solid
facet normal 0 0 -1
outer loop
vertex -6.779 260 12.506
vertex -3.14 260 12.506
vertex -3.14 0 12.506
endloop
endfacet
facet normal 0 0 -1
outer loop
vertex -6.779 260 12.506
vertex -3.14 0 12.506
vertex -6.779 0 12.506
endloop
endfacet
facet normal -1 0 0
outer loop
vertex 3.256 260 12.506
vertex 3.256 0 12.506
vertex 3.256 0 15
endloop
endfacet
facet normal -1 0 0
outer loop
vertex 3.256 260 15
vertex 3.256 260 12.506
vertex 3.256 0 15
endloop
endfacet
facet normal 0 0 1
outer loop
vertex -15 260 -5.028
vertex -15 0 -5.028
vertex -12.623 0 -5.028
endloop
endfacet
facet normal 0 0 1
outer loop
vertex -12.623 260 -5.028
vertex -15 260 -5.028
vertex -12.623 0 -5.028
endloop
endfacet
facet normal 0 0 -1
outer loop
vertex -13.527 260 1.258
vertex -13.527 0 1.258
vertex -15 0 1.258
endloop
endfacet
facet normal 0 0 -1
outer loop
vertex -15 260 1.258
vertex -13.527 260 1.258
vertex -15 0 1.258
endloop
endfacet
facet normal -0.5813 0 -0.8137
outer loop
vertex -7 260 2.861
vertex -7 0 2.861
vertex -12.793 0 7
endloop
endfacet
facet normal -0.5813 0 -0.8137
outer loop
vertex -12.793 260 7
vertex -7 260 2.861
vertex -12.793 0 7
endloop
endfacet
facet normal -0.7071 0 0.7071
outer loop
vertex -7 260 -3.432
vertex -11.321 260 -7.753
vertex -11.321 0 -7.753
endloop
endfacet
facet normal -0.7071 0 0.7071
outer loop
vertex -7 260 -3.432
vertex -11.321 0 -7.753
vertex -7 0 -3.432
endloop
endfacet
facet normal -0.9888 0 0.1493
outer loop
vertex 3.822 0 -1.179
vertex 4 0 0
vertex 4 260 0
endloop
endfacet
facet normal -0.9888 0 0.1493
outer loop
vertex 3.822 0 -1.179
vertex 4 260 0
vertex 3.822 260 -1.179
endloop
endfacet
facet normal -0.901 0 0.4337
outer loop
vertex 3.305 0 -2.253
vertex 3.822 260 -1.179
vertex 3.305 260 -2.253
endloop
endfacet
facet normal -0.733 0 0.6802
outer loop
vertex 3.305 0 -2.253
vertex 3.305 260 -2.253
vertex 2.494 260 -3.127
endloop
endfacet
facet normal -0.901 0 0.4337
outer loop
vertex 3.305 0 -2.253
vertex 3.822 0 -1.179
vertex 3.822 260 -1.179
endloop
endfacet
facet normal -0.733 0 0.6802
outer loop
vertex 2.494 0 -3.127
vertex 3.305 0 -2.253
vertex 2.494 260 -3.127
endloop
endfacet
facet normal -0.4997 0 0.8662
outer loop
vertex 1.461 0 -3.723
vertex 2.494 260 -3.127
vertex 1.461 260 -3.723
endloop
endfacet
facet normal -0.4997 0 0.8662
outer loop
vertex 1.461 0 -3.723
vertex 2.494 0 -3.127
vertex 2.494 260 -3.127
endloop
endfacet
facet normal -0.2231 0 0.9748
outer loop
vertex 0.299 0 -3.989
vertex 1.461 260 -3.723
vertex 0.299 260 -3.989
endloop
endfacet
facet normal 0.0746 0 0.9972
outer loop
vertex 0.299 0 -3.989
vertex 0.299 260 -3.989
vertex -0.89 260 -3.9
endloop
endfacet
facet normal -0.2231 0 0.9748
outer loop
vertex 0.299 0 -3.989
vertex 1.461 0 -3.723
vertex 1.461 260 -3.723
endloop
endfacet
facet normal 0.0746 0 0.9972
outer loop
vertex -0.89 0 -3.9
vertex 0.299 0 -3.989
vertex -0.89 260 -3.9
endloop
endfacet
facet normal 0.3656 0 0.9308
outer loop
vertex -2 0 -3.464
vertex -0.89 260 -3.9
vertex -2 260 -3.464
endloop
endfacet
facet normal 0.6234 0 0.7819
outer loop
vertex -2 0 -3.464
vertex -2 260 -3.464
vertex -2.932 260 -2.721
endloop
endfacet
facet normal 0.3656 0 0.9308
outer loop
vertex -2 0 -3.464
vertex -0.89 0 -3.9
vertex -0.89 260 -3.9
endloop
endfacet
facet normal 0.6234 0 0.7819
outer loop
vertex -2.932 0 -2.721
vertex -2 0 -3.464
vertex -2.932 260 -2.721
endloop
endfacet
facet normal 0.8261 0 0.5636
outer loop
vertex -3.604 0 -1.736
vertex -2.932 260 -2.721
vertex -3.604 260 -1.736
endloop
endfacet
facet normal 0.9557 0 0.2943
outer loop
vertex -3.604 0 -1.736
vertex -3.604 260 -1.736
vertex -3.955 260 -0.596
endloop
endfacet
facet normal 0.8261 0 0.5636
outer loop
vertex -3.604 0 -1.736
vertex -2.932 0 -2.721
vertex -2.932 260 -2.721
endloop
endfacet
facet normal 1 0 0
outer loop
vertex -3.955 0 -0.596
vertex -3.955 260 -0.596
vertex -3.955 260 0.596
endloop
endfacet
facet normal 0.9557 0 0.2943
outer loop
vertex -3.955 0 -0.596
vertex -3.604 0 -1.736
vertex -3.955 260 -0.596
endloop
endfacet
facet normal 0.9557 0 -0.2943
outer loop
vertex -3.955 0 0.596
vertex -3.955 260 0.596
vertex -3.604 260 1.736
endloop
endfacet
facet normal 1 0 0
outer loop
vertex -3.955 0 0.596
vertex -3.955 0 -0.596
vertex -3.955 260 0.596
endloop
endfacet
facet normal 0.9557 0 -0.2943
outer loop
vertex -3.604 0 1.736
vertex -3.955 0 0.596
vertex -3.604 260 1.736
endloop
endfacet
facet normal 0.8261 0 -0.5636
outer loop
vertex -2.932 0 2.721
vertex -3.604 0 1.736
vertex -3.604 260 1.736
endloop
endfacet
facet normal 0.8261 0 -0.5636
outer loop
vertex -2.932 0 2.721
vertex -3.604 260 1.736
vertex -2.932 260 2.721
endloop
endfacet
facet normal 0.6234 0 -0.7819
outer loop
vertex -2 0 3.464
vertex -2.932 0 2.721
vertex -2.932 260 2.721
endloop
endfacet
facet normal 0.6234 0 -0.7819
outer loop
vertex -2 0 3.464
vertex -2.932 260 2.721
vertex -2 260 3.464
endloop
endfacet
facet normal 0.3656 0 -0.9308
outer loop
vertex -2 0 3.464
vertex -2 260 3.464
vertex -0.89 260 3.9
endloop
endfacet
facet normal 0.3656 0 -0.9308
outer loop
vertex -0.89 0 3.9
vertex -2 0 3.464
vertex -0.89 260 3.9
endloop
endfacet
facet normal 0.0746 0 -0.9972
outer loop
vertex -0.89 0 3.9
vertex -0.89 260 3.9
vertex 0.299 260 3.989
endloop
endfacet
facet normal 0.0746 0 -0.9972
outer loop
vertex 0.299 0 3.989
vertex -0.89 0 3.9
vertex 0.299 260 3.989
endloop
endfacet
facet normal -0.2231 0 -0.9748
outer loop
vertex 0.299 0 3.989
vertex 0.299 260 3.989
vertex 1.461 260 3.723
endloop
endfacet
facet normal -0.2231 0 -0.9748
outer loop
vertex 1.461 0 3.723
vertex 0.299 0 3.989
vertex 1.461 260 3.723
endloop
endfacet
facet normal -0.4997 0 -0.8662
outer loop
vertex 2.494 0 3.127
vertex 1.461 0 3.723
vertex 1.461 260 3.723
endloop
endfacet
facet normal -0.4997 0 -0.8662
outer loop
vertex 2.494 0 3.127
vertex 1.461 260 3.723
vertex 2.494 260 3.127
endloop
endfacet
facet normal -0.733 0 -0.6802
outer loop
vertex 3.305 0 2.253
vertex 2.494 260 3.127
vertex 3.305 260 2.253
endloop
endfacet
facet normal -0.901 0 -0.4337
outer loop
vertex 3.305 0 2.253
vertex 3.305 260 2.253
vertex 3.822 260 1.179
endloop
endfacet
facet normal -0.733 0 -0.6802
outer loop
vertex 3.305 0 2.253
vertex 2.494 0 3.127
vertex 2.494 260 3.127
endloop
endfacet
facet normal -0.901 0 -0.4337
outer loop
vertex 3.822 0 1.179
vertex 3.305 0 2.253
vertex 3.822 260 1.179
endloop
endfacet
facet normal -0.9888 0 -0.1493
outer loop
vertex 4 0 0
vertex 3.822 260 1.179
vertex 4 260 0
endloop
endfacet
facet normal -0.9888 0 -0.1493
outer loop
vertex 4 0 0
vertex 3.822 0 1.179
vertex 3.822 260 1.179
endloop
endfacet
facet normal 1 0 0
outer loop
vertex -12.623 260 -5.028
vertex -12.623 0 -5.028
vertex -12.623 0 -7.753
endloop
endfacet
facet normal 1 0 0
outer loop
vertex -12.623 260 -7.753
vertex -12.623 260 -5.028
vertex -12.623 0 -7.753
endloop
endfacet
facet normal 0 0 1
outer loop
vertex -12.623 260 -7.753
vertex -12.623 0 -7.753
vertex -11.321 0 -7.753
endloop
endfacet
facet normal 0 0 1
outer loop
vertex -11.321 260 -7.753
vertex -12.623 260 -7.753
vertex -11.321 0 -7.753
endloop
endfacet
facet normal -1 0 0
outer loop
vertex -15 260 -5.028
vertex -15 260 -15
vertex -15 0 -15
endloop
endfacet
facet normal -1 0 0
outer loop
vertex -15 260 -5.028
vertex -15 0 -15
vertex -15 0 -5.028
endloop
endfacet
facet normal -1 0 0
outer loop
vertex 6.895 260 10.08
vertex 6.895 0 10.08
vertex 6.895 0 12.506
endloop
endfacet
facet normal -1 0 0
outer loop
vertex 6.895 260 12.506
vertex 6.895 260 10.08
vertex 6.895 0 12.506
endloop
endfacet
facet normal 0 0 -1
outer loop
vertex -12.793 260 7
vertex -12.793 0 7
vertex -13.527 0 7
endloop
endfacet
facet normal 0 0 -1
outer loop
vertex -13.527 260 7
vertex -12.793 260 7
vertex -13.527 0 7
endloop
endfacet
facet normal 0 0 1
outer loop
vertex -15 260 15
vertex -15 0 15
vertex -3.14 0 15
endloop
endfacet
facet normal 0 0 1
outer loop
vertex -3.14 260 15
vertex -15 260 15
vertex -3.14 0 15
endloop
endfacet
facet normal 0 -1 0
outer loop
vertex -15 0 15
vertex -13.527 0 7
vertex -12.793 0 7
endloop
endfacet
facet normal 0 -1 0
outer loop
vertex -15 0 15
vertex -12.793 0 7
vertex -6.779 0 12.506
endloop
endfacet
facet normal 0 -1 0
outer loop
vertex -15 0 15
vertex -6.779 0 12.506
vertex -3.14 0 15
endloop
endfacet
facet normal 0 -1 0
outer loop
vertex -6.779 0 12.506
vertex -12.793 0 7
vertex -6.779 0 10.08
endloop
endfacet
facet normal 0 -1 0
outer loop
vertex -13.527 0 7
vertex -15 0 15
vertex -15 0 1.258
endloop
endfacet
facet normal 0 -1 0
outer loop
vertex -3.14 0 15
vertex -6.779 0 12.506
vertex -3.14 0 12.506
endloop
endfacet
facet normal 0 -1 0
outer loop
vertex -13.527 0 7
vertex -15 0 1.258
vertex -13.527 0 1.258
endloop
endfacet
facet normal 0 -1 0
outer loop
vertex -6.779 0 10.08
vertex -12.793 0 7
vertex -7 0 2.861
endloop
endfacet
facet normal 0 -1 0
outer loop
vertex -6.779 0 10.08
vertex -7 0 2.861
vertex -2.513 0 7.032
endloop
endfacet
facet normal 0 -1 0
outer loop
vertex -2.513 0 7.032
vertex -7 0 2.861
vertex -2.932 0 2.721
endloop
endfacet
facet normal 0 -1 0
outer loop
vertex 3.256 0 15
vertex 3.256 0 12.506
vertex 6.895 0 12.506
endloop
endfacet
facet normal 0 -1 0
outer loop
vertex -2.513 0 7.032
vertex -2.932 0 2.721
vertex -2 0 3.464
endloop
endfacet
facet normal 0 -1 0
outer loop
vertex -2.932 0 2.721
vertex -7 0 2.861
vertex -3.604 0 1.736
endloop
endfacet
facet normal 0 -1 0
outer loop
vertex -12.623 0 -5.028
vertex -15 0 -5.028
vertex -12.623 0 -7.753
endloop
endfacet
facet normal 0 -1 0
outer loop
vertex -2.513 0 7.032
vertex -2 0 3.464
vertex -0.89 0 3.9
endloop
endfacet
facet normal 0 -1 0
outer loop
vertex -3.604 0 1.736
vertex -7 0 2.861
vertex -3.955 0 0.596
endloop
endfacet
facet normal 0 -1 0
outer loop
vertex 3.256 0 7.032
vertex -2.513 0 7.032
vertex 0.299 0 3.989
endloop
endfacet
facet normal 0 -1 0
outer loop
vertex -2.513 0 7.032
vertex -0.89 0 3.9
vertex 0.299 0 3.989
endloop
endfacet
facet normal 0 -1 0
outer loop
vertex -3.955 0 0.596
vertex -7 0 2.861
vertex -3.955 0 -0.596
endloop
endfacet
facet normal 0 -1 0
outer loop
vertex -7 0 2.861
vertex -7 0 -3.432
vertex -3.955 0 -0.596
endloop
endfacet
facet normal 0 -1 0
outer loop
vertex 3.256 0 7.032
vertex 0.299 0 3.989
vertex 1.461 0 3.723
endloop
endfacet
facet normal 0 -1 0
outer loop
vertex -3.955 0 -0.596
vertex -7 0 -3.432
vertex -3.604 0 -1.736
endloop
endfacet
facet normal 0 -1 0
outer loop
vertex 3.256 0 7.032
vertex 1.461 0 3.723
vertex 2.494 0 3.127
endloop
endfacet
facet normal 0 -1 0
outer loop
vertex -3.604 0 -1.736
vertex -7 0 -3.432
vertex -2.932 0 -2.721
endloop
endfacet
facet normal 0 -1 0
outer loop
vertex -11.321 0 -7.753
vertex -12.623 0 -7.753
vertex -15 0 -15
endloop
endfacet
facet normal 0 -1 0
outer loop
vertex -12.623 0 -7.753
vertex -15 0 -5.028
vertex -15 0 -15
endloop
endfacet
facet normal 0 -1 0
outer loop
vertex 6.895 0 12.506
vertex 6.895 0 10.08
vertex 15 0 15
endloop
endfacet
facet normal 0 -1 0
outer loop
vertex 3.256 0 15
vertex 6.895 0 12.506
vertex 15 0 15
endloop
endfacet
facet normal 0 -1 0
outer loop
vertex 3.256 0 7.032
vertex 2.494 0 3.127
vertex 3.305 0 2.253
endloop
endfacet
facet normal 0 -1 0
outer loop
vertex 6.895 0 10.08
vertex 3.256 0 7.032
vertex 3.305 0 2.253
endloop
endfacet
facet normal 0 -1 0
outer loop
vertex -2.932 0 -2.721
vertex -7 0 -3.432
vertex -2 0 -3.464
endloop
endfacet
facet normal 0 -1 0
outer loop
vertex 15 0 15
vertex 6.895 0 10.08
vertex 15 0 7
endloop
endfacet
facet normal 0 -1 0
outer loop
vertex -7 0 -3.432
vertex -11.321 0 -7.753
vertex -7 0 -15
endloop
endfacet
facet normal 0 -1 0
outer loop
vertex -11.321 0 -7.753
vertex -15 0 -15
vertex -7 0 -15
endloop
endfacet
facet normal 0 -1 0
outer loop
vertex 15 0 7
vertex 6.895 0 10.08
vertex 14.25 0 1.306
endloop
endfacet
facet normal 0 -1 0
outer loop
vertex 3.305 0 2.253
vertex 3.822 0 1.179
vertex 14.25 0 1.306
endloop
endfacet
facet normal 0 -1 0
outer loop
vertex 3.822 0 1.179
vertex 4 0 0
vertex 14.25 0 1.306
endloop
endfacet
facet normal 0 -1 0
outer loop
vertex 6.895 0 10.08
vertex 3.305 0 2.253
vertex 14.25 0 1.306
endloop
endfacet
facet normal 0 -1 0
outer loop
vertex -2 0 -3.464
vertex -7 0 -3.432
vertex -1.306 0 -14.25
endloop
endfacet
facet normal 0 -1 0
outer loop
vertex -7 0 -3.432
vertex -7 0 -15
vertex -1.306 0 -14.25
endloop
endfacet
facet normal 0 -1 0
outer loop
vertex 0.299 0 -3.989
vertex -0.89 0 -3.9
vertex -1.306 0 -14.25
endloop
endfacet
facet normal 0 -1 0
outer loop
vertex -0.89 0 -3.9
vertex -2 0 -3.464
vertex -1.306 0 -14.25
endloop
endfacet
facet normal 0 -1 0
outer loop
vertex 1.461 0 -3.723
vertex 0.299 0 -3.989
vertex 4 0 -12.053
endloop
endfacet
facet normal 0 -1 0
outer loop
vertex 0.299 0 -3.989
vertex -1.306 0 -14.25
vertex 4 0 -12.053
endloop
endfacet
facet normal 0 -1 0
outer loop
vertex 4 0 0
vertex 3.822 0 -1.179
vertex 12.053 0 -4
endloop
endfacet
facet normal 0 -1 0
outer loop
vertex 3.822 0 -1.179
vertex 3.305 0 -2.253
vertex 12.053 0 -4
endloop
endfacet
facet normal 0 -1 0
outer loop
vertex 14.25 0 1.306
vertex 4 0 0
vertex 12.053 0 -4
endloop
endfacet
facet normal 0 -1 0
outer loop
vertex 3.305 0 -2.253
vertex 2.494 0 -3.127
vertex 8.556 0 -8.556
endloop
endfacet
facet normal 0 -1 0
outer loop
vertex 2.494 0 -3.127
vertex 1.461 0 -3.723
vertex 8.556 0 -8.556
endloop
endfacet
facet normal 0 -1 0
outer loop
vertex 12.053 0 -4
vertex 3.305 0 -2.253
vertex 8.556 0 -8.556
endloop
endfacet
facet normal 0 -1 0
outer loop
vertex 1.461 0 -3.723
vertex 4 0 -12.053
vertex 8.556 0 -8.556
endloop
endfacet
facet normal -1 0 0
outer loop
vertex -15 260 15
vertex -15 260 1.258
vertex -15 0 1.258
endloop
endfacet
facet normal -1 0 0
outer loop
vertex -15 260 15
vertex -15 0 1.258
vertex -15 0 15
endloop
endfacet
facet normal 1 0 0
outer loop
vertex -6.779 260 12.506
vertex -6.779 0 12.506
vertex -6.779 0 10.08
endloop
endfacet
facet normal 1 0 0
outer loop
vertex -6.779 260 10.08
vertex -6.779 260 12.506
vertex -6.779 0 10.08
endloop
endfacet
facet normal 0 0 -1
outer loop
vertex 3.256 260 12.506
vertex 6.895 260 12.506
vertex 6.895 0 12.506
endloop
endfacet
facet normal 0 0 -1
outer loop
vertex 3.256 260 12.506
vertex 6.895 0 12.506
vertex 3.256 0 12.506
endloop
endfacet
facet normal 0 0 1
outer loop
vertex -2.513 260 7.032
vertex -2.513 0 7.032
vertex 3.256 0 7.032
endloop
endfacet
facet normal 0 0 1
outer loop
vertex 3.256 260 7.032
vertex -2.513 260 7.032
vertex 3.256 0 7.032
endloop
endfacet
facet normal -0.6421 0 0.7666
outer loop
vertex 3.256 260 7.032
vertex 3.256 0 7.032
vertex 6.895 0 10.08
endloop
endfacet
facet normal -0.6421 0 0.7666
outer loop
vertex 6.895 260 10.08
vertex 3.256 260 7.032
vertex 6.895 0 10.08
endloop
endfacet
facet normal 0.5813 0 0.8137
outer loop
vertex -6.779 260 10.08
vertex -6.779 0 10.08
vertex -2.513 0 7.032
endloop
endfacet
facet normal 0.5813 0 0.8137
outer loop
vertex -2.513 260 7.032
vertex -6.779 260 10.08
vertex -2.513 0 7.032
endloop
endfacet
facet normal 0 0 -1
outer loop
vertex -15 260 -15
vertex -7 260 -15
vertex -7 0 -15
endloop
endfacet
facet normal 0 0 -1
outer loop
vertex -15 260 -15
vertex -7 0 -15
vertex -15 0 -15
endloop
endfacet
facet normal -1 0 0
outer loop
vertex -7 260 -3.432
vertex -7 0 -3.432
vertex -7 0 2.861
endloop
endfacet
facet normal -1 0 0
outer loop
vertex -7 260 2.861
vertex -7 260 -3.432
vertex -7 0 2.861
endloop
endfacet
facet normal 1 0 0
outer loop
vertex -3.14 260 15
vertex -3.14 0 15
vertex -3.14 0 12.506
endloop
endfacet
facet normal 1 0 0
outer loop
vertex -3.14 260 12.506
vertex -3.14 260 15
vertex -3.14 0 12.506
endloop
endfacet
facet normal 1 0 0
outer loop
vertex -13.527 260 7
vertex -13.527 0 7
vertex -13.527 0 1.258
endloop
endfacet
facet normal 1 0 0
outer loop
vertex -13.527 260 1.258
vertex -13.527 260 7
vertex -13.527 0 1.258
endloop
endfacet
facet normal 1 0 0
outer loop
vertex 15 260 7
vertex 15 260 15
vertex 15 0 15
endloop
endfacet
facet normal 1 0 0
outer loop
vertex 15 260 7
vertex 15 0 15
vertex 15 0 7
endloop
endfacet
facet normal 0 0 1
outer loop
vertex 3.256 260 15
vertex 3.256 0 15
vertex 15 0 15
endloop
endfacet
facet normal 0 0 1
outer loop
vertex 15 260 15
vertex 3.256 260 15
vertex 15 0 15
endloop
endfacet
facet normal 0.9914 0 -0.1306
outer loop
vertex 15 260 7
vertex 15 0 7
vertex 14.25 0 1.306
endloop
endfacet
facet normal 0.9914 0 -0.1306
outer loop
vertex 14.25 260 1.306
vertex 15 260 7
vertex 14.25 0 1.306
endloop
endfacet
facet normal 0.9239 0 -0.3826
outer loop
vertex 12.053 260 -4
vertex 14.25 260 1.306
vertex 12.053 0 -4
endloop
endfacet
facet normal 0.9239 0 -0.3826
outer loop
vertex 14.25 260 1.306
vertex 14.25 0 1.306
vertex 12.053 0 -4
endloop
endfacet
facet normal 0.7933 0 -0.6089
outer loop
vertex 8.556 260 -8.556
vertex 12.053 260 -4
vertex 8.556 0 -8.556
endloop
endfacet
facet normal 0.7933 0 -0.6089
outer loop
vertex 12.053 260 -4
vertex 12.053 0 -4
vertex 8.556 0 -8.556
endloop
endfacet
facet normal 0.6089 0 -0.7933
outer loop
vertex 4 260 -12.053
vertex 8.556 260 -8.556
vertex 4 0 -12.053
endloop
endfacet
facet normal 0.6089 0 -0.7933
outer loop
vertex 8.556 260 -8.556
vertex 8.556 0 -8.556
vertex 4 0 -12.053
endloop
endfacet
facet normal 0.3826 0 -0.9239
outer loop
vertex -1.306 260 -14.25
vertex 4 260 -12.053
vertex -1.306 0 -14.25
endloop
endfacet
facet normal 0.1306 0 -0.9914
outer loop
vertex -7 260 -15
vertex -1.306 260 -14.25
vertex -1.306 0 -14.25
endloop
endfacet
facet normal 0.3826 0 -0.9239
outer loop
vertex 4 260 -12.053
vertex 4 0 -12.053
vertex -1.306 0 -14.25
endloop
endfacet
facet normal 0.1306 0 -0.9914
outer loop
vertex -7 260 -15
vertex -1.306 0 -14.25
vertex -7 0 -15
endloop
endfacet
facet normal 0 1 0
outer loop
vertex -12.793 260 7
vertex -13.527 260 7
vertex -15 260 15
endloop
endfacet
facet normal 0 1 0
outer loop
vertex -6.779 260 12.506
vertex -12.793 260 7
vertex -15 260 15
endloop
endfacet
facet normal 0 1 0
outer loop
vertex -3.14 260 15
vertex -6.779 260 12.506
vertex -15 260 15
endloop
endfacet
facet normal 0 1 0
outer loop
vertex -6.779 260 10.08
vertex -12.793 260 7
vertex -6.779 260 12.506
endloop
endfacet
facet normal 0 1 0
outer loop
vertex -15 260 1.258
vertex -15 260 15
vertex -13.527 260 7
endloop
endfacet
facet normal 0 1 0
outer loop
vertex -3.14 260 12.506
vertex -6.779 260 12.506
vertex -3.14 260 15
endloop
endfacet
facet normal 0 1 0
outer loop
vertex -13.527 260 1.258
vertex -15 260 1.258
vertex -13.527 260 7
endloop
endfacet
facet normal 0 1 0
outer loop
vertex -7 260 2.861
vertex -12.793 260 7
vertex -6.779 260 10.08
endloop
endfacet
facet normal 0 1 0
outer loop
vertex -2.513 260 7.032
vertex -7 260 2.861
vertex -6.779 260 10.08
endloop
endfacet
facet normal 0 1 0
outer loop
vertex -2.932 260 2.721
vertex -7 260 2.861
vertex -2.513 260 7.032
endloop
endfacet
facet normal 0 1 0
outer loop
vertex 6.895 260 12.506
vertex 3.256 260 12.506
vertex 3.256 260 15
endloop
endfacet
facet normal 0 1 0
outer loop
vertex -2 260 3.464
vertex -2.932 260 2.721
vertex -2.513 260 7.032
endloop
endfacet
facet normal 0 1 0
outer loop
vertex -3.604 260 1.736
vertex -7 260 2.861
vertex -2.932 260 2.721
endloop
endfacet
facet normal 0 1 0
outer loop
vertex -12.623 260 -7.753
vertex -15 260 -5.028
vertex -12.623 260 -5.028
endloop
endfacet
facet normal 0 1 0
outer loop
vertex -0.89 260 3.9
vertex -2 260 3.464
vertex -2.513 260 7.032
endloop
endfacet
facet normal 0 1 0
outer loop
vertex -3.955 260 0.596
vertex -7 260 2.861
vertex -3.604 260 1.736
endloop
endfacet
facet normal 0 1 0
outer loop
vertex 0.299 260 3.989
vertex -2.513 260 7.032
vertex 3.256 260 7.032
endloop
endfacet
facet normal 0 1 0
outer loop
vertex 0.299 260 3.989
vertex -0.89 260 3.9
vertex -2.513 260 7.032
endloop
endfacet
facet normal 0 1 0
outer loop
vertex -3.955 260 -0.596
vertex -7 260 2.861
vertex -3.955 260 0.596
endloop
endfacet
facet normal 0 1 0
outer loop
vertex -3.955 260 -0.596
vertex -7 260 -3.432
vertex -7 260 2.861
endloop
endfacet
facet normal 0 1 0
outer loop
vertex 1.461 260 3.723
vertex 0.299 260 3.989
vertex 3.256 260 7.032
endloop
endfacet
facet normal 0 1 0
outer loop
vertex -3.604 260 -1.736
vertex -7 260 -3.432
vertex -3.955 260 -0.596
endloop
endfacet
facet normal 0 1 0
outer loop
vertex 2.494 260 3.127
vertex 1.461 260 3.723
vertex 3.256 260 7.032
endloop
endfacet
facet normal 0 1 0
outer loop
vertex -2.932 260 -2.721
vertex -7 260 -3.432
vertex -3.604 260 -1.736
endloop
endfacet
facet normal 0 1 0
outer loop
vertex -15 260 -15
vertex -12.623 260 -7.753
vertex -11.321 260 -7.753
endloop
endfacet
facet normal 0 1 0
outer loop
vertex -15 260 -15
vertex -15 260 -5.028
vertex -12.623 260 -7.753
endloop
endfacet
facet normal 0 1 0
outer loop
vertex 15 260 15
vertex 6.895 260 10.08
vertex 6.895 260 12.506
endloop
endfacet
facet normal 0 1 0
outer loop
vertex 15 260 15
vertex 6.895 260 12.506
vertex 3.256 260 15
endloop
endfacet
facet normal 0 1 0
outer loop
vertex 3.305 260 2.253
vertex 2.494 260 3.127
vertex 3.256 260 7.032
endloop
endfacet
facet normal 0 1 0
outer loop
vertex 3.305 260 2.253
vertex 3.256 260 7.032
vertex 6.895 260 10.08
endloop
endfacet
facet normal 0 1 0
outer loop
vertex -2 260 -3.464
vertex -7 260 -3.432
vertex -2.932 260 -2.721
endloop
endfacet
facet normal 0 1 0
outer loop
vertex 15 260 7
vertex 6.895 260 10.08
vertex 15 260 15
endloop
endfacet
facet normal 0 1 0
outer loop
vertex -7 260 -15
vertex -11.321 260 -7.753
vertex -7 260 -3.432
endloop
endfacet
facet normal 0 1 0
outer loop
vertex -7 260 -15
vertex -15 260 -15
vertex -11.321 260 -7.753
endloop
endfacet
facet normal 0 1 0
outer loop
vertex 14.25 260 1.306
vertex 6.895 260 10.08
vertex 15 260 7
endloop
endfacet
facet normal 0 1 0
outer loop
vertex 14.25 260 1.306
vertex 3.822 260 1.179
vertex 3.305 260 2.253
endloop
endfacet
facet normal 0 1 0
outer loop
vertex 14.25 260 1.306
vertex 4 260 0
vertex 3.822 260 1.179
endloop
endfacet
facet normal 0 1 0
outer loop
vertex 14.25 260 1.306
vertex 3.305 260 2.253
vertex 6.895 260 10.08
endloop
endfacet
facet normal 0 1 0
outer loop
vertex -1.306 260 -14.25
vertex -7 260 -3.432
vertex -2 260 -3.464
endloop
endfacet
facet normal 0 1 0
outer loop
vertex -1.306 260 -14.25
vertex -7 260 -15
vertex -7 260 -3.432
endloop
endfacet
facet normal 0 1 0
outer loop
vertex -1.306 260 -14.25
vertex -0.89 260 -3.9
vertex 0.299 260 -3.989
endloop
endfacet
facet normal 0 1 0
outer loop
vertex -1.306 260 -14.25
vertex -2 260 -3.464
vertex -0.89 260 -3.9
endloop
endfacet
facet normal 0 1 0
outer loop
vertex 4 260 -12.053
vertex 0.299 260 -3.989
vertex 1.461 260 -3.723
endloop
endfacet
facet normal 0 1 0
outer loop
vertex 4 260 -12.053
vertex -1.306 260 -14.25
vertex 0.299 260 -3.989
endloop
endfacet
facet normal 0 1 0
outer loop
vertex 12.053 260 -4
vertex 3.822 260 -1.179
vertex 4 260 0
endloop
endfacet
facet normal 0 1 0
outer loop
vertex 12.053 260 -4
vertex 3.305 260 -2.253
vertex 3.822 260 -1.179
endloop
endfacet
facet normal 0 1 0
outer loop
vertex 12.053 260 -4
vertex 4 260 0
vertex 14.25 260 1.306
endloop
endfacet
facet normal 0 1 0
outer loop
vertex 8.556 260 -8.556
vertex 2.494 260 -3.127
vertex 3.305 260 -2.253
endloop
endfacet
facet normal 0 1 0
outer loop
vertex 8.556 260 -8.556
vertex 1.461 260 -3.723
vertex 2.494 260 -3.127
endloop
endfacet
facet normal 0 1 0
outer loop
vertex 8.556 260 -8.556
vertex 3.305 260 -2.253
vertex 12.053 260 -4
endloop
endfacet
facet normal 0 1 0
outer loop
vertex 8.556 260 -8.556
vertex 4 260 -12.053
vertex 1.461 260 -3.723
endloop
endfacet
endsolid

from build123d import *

# Parameters (mm, degrees)
CROQUIS1_R              = 4
SALIENTE_EXTRUIR1_DEPTH = 260


with BuildPart() as part:
    # Croquis1 → Saliente-Extruir1 (new body)
    with BuildSketch(Plane(origin=(0, 0, 0), x_dir=(1, 0, 0), z_dir=(0, 1, 0))):
        with BuildLine():
            Line((-7, 15), (-15, 15))
            Line((-15, 15), (-15, 5.027604917))
            Line((-15, 5.027604917), (-12.623437069, 5.027604917))
            Line((-12.623437069, 5.027604917), (-12.623437069, 7.752682341))
            Line((-12.623437069, 7.752682341), (-11.320548438, 7.752682341))
            Line((-11.320548438, 7.752682341), (-7, 3.432133903))
            Line((-7, 3.432133903), (-7, -2.861090311))
            Line((-7, -2.861090311), (-12.793007796, -7))
            Line((-12.793007796, -7), (-13.527286117, -7))
            Line((-13.527286117, -7), (-13.527286117, -1.25796789))
            Line((-13.527286117, -1.25796789), (-15, -1.25796789))
            Line((-15, -1.25796789), (-15, -15))
            Line((-15, -15), (-3.139941254, -15))
            Line((-3.139941254, -15), (-3.139941254, -12.505835019))
            Line((-3.139941254, -12.505835019), (-6.77895709, -12.505835019))
            Line((-6.77895709, -12.505835019), (-6.77895709, -10.079824462))
            Line((-6.77895709, -10.079824462), (-2.512909638, -7.031876702))
            Line((-2.512909638, -7.031876702), (3.25590476, -7.031876702))
            Line((3.25590476, -7.031876702), (6.894920596, -10.079824462))
            Line((6.894920596, -10.079824462), (6.894920596, -12.505835019))
            Line((6.894920596, -12.505835019), (3.25590476, -12.505835019))
            Line((3.25590476, -12.505835019), (3.25590476, -15))
            Line((3.25590476, -15), (15, -15))
            Line((15, -15), (15, -7))
            ThreePointArc((15, -7), (8.556349186, 8.556349186), (-7, 15))
        make_face()
        Circle(CROQUIS1_R, mode=Mode.SUBTRACT)
    extrude(amount=SALIENTE_EXTRUIR1_DEPTH)


solid = part.part
